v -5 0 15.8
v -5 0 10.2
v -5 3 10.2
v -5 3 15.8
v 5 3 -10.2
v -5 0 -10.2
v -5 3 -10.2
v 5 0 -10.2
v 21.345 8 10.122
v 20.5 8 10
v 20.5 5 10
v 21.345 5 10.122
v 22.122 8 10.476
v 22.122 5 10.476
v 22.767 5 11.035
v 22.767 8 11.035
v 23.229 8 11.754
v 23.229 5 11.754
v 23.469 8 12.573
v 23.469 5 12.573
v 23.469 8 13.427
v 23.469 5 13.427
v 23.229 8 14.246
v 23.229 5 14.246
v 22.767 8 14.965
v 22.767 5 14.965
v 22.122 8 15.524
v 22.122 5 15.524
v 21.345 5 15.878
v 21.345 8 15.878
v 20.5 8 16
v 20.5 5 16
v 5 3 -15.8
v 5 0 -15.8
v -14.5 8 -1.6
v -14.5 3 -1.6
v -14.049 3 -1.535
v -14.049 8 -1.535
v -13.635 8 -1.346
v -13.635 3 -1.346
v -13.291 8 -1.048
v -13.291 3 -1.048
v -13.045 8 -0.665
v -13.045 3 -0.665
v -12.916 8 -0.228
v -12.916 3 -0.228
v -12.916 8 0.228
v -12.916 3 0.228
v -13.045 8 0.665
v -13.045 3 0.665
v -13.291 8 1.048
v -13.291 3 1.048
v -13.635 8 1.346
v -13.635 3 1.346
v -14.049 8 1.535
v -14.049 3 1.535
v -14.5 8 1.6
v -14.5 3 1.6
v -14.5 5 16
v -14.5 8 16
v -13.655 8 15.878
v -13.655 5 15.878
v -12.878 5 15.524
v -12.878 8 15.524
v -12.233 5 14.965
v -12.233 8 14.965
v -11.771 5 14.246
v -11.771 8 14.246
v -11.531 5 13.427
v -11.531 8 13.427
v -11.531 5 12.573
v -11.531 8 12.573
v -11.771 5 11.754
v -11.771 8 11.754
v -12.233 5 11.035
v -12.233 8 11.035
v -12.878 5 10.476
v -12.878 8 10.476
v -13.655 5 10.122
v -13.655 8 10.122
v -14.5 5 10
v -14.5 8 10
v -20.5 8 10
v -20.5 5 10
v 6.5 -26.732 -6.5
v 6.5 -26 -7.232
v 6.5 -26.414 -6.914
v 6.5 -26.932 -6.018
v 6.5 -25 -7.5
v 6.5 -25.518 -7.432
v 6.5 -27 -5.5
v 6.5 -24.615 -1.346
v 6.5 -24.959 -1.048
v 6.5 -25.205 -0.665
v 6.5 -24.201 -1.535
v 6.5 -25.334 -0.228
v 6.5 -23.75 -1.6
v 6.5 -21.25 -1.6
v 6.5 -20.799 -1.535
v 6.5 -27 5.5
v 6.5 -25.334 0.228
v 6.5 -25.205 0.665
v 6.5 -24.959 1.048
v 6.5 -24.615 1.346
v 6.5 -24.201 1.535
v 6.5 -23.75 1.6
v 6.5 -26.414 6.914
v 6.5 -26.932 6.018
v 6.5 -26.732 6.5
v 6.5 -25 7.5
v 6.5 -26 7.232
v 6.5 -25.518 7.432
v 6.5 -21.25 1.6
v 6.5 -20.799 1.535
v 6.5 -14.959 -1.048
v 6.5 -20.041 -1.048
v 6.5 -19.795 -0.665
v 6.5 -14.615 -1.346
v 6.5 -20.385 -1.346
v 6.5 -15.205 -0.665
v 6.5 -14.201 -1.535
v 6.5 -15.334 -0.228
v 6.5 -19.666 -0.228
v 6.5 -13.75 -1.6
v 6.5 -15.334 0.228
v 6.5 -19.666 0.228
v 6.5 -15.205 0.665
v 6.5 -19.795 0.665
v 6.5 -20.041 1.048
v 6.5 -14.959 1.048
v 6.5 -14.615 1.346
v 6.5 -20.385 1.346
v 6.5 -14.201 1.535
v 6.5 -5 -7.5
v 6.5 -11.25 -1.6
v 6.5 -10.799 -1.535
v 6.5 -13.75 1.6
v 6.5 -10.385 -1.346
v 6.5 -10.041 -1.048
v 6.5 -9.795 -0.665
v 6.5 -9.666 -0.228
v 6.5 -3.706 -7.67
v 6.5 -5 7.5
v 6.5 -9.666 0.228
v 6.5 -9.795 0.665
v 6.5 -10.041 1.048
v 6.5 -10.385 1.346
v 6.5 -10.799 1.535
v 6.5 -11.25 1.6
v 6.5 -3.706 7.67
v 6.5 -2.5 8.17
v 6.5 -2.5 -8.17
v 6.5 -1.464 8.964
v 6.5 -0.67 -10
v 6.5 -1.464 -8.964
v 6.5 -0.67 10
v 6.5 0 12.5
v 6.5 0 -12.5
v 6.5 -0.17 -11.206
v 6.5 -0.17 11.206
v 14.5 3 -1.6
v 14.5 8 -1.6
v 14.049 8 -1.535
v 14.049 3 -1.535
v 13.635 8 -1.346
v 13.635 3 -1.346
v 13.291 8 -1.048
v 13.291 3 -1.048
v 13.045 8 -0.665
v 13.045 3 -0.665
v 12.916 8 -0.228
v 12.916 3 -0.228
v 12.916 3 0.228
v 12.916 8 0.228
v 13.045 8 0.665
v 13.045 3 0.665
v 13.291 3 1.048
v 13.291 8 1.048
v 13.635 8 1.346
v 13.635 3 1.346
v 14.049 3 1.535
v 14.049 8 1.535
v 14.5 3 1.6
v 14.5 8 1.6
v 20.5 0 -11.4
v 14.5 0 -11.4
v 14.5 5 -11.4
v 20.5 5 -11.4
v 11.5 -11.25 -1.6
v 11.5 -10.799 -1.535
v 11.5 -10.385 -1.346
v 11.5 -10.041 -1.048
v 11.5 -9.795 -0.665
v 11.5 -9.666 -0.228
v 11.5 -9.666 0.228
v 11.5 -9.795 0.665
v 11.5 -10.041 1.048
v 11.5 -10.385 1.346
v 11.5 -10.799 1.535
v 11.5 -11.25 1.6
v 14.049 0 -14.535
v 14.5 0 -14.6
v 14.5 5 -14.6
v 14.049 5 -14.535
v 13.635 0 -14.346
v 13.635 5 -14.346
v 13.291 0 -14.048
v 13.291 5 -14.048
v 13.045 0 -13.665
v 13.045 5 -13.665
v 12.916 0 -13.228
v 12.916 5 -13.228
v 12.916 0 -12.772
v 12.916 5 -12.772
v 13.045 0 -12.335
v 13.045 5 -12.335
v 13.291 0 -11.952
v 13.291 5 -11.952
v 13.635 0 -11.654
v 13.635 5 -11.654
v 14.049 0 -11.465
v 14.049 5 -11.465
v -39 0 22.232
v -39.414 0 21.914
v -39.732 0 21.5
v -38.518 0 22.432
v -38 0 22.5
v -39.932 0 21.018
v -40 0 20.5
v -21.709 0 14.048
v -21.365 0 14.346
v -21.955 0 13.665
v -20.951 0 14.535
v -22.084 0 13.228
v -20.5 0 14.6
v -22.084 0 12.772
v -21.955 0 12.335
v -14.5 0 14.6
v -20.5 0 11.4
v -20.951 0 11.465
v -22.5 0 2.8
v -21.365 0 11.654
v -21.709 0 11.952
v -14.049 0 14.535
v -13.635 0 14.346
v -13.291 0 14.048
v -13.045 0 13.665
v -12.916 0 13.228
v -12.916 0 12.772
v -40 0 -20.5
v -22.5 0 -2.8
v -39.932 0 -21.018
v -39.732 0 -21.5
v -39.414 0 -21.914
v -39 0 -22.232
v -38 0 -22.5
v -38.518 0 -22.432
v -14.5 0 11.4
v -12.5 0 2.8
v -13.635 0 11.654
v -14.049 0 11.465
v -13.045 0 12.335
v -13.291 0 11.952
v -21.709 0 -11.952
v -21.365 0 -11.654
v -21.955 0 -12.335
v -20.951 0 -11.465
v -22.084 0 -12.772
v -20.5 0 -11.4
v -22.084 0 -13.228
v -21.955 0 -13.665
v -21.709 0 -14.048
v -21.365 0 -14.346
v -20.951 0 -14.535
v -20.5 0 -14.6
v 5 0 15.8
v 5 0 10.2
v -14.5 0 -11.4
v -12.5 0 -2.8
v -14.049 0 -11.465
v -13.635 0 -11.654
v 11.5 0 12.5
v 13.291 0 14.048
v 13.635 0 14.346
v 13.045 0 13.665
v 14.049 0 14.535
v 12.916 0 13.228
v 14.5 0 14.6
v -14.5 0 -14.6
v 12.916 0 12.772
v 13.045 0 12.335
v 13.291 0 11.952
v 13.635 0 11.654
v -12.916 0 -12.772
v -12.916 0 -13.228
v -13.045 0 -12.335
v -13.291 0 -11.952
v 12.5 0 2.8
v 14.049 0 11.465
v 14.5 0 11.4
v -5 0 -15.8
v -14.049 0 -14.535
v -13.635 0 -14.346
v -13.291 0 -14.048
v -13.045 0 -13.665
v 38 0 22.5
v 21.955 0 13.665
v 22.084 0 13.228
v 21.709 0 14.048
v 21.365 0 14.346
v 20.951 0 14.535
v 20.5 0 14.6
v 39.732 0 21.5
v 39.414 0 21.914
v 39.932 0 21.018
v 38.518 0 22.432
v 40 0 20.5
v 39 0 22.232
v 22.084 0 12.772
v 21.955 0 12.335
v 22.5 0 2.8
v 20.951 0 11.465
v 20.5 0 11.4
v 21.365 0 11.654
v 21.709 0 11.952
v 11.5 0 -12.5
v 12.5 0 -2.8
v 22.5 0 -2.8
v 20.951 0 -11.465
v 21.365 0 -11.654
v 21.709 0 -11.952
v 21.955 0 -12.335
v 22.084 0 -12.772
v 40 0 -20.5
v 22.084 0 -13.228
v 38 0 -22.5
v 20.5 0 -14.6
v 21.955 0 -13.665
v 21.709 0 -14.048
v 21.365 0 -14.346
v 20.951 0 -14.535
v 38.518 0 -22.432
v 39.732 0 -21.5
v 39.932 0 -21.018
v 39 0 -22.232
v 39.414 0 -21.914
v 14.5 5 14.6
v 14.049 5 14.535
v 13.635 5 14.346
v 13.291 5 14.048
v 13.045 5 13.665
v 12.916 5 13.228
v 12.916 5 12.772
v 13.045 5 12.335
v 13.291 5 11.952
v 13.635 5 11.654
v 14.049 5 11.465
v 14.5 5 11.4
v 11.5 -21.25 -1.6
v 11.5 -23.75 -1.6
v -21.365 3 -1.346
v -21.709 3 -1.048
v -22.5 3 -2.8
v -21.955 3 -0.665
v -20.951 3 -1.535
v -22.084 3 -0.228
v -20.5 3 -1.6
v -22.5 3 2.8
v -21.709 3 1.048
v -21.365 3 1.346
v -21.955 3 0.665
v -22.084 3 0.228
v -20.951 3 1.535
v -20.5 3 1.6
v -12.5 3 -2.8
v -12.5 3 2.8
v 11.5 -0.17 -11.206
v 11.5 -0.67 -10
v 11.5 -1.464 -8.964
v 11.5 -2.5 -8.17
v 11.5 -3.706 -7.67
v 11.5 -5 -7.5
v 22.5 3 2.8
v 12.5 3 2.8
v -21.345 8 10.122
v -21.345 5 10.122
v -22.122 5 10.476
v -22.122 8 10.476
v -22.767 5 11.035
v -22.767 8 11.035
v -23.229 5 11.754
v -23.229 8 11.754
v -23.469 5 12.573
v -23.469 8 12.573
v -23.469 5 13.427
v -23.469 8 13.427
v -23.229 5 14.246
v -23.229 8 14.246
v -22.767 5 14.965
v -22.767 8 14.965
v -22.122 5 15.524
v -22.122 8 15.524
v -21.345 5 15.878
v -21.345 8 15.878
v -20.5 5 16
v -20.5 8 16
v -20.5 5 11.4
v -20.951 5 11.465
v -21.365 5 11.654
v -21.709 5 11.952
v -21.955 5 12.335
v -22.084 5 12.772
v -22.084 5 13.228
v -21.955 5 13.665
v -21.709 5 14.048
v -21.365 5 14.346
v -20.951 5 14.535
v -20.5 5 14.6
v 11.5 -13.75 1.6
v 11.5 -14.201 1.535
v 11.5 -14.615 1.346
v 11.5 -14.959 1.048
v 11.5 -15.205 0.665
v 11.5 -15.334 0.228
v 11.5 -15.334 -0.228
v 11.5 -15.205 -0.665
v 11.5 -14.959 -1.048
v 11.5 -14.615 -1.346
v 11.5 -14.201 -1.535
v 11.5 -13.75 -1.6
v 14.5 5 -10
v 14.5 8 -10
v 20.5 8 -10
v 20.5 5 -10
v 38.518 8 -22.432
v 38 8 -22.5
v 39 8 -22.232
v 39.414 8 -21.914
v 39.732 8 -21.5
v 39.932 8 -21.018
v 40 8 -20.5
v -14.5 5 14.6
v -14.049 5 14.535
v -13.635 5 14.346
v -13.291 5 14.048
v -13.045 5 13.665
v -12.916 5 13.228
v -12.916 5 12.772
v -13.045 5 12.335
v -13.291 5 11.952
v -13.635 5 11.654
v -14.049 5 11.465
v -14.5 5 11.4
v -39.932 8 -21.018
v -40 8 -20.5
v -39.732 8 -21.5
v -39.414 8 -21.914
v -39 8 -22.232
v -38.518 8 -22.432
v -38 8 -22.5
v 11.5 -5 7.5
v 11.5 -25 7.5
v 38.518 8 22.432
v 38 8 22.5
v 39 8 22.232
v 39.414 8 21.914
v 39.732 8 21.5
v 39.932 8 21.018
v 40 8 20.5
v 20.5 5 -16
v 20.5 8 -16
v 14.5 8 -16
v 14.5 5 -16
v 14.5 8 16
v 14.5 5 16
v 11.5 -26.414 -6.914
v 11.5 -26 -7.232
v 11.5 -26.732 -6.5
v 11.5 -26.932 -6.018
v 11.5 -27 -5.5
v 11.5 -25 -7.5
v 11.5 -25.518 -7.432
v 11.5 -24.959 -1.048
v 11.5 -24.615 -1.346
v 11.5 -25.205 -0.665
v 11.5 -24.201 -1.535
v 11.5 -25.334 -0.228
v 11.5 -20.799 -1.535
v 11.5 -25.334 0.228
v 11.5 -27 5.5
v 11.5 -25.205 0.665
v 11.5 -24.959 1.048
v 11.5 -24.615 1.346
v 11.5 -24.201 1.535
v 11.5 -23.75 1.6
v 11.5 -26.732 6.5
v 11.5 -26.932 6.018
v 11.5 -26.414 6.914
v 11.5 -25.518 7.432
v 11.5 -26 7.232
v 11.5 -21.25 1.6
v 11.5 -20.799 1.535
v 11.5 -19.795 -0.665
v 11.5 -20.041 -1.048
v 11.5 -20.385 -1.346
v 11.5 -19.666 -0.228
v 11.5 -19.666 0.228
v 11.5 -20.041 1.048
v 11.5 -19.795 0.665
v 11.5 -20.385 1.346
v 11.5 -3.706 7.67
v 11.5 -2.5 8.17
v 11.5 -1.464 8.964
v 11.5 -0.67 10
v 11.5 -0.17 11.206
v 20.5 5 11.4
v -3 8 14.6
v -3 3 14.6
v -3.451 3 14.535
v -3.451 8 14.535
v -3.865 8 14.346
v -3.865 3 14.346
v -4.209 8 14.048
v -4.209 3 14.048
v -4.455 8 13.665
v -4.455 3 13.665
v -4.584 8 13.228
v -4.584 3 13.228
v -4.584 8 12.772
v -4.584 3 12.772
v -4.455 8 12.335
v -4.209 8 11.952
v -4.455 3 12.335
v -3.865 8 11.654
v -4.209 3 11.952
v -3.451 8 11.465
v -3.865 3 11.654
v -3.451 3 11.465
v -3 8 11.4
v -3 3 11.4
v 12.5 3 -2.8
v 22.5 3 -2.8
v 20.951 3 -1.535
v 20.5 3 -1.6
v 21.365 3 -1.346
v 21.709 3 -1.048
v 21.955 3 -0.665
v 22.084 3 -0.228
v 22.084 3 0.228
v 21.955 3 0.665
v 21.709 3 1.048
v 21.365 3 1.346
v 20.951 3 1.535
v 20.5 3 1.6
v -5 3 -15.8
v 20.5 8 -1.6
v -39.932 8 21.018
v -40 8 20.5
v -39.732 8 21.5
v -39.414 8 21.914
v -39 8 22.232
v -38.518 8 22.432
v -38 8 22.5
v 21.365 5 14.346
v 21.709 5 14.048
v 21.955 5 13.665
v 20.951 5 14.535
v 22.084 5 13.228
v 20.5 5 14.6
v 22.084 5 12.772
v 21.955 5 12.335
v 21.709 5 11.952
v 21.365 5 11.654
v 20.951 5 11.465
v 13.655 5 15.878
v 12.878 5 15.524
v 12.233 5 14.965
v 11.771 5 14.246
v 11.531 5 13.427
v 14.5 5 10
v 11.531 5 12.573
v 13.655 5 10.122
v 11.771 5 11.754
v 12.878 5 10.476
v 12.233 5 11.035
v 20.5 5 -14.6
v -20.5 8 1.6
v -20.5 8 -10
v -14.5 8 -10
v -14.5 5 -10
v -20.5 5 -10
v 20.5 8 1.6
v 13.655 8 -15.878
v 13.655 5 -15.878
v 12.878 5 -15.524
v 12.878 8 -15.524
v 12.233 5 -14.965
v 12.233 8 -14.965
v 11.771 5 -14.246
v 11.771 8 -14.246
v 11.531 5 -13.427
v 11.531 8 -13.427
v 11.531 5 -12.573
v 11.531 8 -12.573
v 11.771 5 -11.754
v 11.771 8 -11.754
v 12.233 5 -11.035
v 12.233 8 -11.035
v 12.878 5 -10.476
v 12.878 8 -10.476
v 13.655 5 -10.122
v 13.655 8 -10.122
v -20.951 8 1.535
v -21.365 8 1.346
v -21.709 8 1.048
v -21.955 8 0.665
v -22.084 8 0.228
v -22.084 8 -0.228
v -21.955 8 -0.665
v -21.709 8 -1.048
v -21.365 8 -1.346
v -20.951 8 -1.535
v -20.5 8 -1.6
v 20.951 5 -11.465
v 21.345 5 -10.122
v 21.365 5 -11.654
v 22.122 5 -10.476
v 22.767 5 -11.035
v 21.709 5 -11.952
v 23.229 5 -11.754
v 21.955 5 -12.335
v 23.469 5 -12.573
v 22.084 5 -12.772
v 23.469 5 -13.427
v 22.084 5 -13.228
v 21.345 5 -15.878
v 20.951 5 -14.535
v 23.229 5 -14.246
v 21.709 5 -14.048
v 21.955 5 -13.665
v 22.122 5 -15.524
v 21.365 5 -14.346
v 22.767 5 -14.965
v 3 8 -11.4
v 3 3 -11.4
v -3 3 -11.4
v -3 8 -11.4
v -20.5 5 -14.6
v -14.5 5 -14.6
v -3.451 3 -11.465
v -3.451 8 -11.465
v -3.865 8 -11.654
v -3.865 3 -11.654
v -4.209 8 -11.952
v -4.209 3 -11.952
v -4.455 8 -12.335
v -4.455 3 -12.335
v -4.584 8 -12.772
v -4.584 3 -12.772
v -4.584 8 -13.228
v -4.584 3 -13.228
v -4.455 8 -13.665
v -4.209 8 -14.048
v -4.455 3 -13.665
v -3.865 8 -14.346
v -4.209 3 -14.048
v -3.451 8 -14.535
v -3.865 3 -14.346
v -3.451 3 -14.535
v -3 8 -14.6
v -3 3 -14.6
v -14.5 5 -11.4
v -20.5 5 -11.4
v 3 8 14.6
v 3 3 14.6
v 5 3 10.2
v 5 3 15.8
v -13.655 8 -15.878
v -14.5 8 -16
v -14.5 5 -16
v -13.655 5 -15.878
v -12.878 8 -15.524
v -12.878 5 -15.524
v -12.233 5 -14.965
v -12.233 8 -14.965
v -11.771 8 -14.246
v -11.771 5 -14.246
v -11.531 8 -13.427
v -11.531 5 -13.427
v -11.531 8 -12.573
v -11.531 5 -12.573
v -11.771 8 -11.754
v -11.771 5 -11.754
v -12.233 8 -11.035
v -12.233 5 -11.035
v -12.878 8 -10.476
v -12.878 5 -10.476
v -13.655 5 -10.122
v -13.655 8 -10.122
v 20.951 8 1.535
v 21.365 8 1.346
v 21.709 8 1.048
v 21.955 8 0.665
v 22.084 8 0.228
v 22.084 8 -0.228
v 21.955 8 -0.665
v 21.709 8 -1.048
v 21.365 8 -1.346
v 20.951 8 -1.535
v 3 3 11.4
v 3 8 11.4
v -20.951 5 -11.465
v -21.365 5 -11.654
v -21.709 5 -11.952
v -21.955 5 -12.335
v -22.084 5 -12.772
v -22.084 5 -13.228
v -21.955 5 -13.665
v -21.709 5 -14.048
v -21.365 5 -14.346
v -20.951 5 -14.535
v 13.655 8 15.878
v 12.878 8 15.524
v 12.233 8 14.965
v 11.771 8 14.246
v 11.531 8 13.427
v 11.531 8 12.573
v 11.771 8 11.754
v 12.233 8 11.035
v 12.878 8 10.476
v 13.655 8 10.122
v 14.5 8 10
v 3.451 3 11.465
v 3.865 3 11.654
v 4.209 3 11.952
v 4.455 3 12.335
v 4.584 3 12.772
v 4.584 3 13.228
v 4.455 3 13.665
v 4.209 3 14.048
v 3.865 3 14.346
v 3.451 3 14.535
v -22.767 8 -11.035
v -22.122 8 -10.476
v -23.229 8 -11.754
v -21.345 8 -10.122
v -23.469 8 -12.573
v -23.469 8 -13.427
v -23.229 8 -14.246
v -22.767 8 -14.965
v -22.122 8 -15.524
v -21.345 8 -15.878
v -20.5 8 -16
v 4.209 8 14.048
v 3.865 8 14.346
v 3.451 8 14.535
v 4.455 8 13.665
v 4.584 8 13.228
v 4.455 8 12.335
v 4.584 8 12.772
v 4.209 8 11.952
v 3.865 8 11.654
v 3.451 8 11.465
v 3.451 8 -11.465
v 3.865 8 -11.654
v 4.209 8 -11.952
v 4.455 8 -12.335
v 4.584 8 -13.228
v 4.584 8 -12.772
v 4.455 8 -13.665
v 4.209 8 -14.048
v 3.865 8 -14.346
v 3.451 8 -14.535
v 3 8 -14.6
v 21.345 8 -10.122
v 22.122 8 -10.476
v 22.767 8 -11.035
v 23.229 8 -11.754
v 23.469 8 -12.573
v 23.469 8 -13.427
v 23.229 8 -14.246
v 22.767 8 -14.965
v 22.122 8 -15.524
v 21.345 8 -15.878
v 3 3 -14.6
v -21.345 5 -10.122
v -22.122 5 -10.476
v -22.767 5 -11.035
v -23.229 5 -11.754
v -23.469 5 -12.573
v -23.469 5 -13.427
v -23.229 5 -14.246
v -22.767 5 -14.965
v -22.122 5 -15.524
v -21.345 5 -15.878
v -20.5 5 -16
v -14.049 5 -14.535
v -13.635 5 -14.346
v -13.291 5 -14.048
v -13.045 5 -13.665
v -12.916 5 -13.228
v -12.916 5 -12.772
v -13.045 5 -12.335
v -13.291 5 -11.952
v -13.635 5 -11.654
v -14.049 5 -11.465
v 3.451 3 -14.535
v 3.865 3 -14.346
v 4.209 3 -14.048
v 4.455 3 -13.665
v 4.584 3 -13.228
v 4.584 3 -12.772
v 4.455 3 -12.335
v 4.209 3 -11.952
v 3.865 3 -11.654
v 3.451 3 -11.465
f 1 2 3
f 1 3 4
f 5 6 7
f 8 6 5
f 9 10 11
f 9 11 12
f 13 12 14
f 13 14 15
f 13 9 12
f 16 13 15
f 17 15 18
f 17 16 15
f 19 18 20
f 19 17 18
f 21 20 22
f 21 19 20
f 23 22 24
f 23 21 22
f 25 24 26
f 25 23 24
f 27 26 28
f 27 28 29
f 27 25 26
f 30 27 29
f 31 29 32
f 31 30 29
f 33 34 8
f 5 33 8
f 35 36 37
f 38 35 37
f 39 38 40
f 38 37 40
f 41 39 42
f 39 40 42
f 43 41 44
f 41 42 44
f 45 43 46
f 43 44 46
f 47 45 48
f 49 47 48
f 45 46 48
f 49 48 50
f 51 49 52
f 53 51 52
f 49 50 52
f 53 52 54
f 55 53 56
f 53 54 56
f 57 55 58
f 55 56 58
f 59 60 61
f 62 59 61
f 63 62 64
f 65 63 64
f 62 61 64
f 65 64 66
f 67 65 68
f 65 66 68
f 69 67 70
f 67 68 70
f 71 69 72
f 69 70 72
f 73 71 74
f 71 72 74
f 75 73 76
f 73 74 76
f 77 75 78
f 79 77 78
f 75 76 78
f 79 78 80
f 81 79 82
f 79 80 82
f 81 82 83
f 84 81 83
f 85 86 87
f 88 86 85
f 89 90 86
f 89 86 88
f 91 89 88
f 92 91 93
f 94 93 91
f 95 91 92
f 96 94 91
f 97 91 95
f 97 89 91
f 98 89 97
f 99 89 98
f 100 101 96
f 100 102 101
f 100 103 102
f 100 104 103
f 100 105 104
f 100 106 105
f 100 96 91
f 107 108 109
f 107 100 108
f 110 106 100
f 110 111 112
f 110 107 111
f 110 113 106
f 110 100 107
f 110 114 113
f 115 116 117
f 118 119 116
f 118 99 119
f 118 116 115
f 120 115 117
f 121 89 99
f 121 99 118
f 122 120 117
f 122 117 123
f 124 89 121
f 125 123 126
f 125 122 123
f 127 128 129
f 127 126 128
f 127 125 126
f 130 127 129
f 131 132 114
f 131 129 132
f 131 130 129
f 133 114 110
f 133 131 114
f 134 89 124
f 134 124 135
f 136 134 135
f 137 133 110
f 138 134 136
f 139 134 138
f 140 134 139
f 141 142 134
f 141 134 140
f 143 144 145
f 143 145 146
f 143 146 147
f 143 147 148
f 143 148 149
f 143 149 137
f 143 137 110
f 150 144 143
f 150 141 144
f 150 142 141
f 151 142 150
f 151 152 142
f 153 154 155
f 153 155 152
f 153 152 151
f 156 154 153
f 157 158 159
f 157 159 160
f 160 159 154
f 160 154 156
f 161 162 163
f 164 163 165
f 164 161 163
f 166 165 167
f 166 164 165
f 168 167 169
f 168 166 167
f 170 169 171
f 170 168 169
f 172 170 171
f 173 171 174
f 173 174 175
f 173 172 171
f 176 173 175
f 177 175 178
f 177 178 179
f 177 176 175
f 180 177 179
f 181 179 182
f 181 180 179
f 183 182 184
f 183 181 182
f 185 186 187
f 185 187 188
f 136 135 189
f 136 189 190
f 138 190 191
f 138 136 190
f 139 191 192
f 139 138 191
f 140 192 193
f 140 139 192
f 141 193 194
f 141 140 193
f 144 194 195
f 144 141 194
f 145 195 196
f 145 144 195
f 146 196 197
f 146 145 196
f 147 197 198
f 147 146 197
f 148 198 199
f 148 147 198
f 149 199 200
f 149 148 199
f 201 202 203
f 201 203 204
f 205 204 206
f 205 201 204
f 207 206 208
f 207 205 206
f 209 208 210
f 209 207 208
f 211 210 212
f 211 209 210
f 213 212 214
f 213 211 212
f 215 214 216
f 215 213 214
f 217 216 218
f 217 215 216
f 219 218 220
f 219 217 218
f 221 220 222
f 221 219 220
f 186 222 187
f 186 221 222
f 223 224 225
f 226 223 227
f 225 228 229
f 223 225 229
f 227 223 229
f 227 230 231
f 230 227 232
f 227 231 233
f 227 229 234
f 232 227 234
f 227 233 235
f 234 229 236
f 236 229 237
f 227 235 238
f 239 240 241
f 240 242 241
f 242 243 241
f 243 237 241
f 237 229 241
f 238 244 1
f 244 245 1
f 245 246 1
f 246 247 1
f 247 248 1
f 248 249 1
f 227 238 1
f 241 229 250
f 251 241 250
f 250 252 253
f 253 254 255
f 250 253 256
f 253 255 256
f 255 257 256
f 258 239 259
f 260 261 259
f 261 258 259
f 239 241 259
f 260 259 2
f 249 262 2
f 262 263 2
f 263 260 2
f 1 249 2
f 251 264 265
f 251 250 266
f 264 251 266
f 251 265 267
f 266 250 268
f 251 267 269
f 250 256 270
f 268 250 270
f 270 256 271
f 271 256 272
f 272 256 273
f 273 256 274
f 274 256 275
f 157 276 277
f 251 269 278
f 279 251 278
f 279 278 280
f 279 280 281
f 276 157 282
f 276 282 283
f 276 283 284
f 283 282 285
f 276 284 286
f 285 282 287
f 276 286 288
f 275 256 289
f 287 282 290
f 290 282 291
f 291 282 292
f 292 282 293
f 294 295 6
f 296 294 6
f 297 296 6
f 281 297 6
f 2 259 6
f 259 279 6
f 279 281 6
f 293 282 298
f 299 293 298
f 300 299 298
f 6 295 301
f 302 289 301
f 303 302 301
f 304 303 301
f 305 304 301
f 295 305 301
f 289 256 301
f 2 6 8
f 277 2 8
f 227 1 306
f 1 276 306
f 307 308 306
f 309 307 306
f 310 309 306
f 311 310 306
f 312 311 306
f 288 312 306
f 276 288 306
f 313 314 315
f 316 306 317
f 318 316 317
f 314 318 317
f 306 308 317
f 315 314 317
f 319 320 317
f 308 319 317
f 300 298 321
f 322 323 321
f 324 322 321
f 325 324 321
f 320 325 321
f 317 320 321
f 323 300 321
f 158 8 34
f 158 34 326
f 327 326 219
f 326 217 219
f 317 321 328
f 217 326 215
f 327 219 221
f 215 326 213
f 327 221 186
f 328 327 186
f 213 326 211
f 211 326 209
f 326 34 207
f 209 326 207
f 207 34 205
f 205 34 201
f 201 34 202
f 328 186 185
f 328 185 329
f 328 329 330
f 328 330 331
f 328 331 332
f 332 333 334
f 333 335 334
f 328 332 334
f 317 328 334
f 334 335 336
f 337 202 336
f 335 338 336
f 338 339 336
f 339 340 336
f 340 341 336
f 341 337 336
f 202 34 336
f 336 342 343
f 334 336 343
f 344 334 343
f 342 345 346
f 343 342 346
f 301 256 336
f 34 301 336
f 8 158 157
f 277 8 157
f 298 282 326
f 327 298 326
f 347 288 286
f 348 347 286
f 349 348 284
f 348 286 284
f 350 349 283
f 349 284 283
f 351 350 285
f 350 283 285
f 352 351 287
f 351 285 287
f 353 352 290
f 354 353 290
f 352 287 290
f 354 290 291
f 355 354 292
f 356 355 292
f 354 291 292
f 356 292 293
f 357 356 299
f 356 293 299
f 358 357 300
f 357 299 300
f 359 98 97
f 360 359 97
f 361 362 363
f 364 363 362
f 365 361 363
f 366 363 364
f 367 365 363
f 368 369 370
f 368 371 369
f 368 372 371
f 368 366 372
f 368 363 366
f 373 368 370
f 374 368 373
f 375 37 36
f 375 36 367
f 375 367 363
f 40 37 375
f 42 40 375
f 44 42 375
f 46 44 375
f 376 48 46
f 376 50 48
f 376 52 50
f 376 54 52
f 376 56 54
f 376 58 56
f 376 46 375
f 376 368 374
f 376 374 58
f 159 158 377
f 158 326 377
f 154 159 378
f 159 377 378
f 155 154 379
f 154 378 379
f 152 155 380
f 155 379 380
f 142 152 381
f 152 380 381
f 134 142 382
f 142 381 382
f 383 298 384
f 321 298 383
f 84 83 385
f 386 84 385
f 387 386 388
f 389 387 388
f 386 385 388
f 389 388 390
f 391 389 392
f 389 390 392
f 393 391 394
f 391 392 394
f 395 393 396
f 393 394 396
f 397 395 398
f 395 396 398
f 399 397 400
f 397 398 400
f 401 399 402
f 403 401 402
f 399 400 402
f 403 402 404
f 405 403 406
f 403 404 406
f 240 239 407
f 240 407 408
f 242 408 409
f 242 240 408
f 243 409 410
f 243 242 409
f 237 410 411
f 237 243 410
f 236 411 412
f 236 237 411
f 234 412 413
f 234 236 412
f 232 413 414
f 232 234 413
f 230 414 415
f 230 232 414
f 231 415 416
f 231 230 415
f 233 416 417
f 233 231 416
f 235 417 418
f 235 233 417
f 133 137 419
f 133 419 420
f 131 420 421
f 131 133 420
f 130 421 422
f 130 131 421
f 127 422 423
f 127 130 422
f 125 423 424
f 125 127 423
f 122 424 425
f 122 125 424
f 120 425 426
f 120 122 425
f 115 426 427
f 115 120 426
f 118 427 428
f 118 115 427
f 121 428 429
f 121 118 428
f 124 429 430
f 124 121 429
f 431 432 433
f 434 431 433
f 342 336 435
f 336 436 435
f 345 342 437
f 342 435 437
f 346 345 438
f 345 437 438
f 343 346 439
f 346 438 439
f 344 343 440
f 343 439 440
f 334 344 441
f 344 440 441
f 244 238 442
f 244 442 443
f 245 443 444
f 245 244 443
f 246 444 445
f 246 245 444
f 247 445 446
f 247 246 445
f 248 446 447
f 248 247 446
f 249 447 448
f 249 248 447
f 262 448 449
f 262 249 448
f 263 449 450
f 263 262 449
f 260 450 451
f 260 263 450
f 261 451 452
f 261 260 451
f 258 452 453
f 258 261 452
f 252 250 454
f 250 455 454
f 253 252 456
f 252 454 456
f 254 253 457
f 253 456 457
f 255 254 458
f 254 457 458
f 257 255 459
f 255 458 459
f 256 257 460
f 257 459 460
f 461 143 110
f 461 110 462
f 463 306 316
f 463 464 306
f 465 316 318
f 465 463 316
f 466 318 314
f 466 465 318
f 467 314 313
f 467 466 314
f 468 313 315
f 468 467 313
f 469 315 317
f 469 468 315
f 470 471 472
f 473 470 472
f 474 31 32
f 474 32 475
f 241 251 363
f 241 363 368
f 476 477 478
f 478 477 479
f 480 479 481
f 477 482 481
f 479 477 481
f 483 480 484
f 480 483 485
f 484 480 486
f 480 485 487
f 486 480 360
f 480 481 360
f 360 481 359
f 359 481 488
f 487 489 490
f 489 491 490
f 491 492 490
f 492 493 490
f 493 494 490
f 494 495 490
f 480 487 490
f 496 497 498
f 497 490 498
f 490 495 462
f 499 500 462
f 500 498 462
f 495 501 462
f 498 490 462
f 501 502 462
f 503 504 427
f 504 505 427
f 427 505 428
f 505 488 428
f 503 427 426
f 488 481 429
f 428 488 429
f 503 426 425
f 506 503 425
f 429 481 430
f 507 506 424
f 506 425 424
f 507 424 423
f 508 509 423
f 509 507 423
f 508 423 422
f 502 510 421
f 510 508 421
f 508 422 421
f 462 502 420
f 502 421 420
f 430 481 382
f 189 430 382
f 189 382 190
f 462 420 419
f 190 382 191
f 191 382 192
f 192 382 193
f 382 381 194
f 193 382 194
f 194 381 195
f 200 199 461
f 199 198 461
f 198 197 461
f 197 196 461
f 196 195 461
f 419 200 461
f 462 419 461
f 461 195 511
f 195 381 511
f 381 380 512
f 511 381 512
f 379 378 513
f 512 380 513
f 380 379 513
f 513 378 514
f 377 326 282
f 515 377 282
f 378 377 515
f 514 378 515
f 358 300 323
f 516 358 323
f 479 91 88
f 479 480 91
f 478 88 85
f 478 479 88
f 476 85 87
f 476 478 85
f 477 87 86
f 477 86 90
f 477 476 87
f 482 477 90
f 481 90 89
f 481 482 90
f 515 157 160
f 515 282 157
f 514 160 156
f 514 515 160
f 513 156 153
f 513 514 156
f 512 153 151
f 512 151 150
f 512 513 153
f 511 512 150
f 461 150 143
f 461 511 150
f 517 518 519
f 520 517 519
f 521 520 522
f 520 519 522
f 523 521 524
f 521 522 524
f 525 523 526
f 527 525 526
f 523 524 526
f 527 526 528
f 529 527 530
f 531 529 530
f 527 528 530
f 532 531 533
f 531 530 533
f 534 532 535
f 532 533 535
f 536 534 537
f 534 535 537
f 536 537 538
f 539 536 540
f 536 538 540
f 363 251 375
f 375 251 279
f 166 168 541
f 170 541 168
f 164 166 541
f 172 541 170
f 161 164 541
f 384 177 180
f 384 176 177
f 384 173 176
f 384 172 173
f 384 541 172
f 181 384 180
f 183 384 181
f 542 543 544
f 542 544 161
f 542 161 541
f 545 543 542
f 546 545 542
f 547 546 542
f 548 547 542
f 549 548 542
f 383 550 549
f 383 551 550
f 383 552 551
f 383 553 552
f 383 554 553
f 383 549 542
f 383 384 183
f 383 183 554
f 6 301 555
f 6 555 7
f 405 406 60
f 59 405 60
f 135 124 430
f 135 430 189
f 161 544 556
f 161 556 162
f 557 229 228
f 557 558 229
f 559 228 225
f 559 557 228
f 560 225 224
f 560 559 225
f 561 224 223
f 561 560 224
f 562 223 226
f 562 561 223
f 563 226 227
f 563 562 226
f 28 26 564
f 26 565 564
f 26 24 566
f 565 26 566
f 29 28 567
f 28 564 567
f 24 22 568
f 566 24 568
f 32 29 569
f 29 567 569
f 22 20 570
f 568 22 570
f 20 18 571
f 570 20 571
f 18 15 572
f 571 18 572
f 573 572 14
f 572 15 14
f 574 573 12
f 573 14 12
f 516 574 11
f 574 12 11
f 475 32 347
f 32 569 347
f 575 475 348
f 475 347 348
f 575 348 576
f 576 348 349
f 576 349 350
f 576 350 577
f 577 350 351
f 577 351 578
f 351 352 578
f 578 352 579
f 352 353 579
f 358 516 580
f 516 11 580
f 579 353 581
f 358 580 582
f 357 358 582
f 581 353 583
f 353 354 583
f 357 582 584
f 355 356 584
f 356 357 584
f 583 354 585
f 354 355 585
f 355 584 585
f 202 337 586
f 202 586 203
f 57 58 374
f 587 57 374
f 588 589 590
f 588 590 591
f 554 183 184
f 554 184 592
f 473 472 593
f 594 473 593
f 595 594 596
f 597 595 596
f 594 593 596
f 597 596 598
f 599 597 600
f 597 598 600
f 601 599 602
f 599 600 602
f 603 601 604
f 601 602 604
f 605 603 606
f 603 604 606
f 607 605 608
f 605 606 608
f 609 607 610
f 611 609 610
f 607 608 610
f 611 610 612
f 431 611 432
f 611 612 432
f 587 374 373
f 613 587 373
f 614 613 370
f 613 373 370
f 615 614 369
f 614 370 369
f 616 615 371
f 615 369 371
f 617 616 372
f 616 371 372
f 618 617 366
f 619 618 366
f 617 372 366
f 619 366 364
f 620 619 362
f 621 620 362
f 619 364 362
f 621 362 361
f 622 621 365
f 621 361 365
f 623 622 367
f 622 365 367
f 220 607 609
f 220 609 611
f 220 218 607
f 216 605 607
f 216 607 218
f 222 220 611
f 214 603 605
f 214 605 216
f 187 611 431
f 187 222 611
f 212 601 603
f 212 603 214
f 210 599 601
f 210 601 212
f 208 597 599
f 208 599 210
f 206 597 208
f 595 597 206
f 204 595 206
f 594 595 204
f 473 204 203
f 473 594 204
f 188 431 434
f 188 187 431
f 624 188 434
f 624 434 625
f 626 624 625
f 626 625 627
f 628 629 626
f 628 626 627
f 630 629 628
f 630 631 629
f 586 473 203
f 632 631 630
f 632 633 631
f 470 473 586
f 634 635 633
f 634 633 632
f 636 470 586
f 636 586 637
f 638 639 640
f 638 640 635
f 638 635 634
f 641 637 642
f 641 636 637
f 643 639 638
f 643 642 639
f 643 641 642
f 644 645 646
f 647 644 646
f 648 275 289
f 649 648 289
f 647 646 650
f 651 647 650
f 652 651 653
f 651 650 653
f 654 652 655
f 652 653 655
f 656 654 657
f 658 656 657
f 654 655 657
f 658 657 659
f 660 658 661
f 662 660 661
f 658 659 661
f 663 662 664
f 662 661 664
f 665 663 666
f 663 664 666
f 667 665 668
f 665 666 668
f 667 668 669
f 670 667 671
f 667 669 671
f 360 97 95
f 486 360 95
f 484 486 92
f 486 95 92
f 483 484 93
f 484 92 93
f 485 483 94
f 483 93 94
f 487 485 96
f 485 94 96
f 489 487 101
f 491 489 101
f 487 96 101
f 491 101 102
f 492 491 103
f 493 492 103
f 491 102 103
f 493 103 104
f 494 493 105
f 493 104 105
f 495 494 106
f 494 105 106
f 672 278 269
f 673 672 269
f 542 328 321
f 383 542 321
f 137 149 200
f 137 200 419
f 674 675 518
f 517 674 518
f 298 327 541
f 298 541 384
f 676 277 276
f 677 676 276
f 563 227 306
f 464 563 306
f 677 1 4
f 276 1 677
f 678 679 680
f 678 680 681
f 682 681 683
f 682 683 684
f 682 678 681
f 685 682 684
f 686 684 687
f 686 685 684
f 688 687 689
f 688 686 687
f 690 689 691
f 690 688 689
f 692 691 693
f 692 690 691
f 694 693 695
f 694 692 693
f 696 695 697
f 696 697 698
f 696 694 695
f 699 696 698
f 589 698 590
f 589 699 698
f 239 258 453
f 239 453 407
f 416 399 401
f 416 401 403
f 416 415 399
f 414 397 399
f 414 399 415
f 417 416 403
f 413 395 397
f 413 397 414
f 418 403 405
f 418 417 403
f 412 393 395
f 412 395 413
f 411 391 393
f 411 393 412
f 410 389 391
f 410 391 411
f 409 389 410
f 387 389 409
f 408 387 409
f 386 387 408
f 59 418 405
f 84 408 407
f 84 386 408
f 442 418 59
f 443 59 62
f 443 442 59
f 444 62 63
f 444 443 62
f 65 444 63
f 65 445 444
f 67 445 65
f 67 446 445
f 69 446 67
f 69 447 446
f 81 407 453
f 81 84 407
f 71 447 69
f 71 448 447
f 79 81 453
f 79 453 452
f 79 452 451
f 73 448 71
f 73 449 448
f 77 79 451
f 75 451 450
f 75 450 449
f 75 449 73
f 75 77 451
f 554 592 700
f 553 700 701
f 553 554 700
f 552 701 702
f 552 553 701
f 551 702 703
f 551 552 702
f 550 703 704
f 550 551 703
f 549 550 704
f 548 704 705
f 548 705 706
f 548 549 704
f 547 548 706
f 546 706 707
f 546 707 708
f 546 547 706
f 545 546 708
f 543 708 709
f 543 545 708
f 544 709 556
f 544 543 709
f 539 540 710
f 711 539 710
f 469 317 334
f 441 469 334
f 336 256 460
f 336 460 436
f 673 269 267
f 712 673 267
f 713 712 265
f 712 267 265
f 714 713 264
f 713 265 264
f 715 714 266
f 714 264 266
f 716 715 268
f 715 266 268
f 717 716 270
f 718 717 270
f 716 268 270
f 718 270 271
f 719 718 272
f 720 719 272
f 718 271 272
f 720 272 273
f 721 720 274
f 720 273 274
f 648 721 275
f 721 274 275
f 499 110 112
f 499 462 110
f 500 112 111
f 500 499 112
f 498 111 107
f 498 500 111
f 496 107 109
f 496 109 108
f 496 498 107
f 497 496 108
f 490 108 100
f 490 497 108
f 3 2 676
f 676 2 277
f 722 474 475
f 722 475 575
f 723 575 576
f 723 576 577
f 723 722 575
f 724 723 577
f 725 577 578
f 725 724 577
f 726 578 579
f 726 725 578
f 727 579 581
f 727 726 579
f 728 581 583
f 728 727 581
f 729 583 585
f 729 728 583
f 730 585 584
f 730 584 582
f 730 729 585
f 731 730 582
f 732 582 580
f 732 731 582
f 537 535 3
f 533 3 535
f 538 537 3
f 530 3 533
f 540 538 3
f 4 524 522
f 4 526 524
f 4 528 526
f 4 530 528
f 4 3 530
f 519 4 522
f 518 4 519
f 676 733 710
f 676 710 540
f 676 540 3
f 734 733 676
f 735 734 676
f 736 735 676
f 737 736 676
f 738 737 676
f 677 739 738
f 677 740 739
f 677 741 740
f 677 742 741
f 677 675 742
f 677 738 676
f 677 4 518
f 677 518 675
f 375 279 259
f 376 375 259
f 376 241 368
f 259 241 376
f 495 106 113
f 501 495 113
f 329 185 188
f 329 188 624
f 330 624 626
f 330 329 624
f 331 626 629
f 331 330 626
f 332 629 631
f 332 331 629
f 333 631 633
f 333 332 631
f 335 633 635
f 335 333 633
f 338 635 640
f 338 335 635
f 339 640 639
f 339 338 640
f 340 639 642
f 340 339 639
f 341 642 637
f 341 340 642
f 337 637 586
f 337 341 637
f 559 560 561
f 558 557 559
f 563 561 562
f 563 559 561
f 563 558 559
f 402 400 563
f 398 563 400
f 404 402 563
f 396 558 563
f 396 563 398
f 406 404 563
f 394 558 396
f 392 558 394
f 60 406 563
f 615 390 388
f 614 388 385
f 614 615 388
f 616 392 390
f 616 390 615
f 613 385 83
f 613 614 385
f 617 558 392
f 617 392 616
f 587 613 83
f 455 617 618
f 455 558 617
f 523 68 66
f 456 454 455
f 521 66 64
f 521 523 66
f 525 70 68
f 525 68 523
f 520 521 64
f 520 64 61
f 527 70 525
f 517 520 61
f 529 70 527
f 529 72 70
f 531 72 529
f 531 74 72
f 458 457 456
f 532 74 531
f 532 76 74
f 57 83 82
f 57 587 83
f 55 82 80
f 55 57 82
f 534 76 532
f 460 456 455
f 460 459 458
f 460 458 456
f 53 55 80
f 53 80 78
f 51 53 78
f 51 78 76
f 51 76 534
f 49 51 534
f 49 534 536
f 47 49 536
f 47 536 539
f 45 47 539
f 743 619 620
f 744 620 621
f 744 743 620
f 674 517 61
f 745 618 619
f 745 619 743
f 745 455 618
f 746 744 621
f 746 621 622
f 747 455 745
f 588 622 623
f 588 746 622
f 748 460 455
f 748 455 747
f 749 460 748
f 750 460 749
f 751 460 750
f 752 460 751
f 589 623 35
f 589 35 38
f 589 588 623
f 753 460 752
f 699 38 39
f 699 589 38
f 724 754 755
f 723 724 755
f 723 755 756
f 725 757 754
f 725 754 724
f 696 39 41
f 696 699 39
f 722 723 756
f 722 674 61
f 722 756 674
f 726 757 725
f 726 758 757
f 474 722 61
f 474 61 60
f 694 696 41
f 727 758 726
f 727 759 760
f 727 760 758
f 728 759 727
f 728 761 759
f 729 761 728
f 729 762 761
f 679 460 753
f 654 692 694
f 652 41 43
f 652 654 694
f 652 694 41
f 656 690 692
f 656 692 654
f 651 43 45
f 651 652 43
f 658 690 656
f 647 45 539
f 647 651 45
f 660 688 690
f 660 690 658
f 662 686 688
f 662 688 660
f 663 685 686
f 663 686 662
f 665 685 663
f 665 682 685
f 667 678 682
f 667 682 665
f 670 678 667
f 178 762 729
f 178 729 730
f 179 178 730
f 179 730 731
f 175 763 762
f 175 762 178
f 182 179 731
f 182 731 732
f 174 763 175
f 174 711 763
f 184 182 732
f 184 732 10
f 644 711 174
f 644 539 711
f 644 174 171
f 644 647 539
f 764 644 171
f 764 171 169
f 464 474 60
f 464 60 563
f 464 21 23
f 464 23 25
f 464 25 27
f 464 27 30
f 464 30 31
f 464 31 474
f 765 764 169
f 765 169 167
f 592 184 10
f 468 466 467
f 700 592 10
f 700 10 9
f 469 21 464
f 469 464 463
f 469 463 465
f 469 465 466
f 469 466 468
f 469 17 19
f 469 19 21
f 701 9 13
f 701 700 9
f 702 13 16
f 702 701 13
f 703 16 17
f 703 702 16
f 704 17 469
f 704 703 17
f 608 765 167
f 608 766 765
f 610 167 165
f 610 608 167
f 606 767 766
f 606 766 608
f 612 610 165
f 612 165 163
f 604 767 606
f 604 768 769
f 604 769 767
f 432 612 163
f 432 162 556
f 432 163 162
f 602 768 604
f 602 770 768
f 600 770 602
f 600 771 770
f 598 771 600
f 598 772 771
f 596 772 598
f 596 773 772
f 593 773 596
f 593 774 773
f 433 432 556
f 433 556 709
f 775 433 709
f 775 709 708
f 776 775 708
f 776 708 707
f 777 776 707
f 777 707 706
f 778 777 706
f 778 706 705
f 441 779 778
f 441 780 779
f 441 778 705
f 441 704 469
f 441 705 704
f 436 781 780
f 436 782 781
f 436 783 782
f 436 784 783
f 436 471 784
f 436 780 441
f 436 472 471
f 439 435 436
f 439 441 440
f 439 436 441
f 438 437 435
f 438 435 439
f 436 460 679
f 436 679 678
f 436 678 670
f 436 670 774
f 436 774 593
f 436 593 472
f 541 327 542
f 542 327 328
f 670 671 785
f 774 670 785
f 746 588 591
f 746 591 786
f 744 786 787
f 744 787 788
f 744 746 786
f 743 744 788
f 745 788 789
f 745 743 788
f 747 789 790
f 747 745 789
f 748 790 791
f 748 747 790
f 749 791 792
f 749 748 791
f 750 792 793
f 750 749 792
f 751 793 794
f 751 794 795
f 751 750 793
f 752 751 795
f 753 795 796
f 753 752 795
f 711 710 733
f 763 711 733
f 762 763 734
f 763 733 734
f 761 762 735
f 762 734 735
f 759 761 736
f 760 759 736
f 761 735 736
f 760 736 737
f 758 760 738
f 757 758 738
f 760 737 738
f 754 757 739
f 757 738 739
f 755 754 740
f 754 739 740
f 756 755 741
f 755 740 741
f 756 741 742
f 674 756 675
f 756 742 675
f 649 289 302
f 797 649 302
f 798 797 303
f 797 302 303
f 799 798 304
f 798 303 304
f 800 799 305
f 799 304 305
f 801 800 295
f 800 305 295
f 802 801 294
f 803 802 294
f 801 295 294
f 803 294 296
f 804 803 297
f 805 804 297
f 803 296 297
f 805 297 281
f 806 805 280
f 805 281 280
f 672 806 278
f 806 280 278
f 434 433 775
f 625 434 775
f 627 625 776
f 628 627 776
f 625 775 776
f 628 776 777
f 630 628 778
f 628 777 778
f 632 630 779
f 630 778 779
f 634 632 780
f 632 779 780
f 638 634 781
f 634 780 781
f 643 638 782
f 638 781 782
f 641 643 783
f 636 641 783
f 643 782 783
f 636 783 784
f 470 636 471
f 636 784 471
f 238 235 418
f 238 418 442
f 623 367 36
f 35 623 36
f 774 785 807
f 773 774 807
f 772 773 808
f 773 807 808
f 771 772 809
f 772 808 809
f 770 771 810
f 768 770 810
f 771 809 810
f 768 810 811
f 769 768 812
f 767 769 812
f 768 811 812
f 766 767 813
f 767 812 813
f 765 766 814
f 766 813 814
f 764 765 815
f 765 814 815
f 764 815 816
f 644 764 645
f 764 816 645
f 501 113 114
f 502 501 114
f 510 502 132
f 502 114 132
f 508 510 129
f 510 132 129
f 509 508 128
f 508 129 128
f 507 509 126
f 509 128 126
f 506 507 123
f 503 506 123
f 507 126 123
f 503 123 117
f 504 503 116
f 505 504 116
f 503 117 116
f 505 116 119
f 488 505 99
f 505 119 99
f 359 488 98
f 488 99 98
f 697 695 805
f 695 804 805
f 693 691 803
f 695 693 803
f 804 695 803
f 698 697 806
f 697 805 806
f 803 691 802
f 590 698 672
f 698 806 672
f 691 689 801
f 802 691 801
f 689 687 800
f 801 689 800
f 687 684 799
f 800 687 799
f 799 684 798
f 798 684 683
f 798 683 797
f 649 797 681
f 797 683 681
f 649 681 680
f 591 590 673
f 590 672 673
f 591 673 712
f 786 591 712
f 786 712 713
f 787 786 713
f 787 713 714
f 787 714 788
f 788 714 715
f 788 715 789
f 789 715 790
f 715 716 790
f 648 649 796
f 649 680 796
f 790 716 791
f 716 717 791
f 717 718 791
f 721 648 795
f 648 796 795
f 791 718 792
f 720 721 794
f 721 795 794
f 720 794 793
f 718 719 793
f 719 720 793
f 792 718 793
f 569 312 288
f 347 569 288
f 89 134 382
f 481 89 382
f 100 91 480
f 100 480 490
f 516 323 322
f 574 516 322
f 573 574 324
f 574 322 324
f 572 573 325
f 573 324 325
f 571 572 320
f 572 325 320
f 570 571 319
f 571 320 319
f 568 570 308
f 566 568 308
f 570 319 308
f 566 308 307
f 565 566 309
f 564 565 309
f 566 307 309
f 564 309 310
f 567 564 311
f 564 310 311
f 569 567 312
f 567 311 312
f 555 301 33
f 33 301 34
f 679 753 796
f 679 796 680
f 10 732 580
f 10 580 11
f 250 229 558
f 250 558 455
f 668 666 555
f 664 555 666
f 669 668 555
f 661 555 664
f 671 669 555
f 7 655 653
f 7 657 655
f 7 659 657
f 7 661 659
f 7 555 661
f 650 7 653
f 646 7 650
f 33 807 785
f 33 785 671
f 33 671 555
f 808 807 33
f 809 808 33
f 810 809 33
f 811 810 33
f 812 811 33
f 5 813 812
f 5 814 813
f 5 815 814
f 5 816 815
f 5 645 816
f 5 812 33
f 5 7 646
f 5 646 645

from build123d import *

# Parameters (mm, degrees)
CROQUIS2_W              = 80
CROQUIS2_H              = 45
SALIENTE_EXTRUIR1_DEPTH = 8
CORTAR_EXTRUIR1_DEPTH   = 3
CROQUIS4_W              = 5
CROQUIS4_H              = 15
SALIENTE_EXTRUIR2_DEPTH = 35
CORTAR_EXTRUIR2_DEPTH   = 34.5
REDONDEO1_R             = 5
CROQUIS6_W              = 10
CROQUIS6_H              = 5.6
CORTAR_EXTRUIR3_DEPTH   = 3
CROQUIS8_W              = 15
CROQUIS8_H              = 8
CORTAR_EXTRUIR4_DEPTH   = 34.5
REDONDEO2_R             = 2


with BuildPart() as part:
    # Croquis2 → Saliente-Extruir1 (new body)
    with BuildSketch(Plane(origin=(0, 0, 0), x_dir=(1, 0, 0), z_dir=(0, 1, 0))):
        Rectangle(CROQUIS2_W, CROQUIS2_H)
        with BuildLine():
            Line((-20.5, 14.6), (-14.5, 14.6))
            ThreePointArc((-14.5, 14.6), (-12.9, 13), (-14.5, 11.4))
            Line((-14.5, 11.4), (-20.5, 11.4))
            ThreePointArc((-20.5, 11.4), (-22.1, 13), (-20.5, 14.6))
        make_face(mode=Mode.SUBTRACT)
        with BuildLine():
            Line((20.5, 14.6), (14.5, 14.6))
            ThreePointArc((14.5, 14.6), (12.9, 13), (14.5, 11.4))
            Line((14.5, 11.4), (20.5, 11.4))
            ThreePointArc((20.5, 11.4), (22.1, 13), (20.5, 14.6))
        make_face(mode=Mode.SUBTRACT)
        with BuildLine():
            Line((20.5, -14.6), (14.5, -14.6))
            ThreePointArc((14.5, -14.6), (12.9, -13), (14.5, -11.4))
            Line((14.5, -11.4), (20.5, -11.4))
            ThreePointArc((20.5, -11.4), (22.1, -13), (20.5, -14.6))
        make_face(mode=Mode.SUBTRACT)
        with BuildLine():
            Line((-20.5, -14.6), (-14.5, -14.6))
            ThreePointArc((-14.5, -14.6), (-12.9, -13), (-14.5, -11.4))
            Line((-14.5, -11.4), (-20.5, -11.4))
            ThreePointArc((-20.5, -11.4), (-22.1, -13), (-20.5, -14.6))
        make_face(mode=Mode.SUBTRACT)
        with BuildLine():
            Line((-20.5, 1.6), (-14.5, 1.6))
            ThreePointArc((-14.5, 1.6), (-12.9, 0), (-14.5, -1.6))
            Line((-14.5, -1.6), (-20.5, -1.6))
            ThreePointArc((-20.5, -1.6), (-22.1, 0), (-20.5, 1.6))
        make_face(mode=Mode.SUBTRACT)
        with BuildLine():
            Line((20.5, 1.6), (14.5, 1.6))
            ThreePointArc((14.5, 1.6), (12.9, 0), (14.5, -1.6))
            Line((14.5, -1.6), (20.5, -1.6))
            ThreePointArc((20.5, -1.6), (22.1, 0), (20.5, 1.6))
        make_face(mode=Mode.SUBTRACT)
        with BuildLine():
            Line((-3, 14.6), (3, 14.6))
            ThreePointArc((3, 14.6), (4.6, 13), (3, 11.4))
            Line((3, 11.4), (-3, 11.4))
            ThreePointArc((-3, 11.4), (-4.6, 13), (-3, 14.6))
        make_face(mode=Mode.SUBTRACT)
        with BuildLine():
            Line((-3, -11.4), (3, -11.4))
            ThreePointArc((3, -11.4), (4.6, -13), (3, -14.6))
            Line((3, -14.6), (-3, -14.6))
            ThreePointArc((-3, -14.6), (-4.6, -13), (-3, -11.4))
        make_face(mode=Mode.SUBTRACT)
    extrude(amount=SALIENTE_EXTRUIR1_DEPTH)

    # Croquis3 → Cortar-Extruir1 (cut)
    with BuildSketch(Plane(origin=(0, 8, 0), x_dir=(1, 0, 0), z_dir=(0, 1, 0))):
        with BuildLine():
            Line((-20.5, 16), (-14.5, 16))
            ThreePointArc((-14.5, 16), (-11.5, 13), (-14.5, 10))
            Line((-14.5, 10), (-20.5, 10))
            ThreePointArc((-20.5, 10), (-23.5, 13), (-20.5, 16))
        make_face()
        with BuildLine():
            Line((20.5, 16), (14.5, 16))
            ThreePointArc((14.5, 16), (11.5, 13), (14.5, 10))
            Line((14.5, 10), (20.5, 10))
            ThreePointArc((20.5, 10), (23.5, 13), (20.5, 16))
        make_face()
        with BuildLine():
            Line((20.5, -16), (14.5, -16))
            ThreePointArc((14.5, -16), (11.5, -13), (14.5, -10))
            Line((14.5, -10), (20.5, -10))
            ThreePointArc((20.5, -10), (23.5, -13), (20.5, -16))
        make_face()
        with BuildLine():
            Line((-20.5, -16), (-14.5, -16))
            ThreePointArc((-14.5, -16), (-11.5, -13), (-14.5, -10))
            Line((-14.5, -10), (-20.5, -10))
            ThreePointArc((-20.5, -10), (-23.5, -13), (-20.5, -16))
        make_face()
    extrude(amount=-CORTAR_EXTRUIR1_DEPTH, mode=Mode.SUBTRACT)

    # Croquis4 → Saliente-Extruir2 (add)
    with BuildSketch(Plane.XZ):
        with Locations((9, 0)):
            Rectangle(CROQUIS4_W, CROQUIS4_H)
    extrude(amount=SALIENTE_EXTRUIR2_DEPTH)

    # Croquis5 → Cortar-Extruir2 (cut, through all)
    with BuildSketch(Plane.ZY.offset(-6.5)):
        with BuildLine():
            Line((1.6, -11.25), (1.6, -13.75))
            ThreePointArc((1.6, -13.75), (0, -15.35), (-1.6, -13.75))
            Line((-1.6, -13.75), (-1.6, -11.25))
            ThreePointArc((-1.6, -11.25), (0, -9.65), (1.6, -11.25))
        make_face()
        with BuildLine():
            Line((1.6, -23.75), (1.6, -21.25))
            ThreePointArc((1.6, -21.25), (0, -19.65), (-1.6, -21.25))
            Line((-1.6, -21.25), (-1.6, -23.75))
            ThreePointArc((-1.6, -23.75), (0, -25.35), (1.6, -23.75))
        make_face()
    extrude(amount=-CORTAR_EXTRUIR2_DEPTH, mode=Mode.SUBTRACT)

    # Redondeo1
    redondeo1_edges = [part.edges().sort_by_distance(p)[0] for p in [
        (9, 0, 7.5),
        (9, 0, -7.5),
    ]]
    fillet(redondeo1_edges, radius=REDONDEO1_R)

    # Croquis6 → Cortar-Extruir3 (cut)
    with BuildSketch(Plane.XZ):
        with Locations((-17.5, 0)):
            Rectangle(CROQUIS6_W, CROQUIS6_H)
        with Locations((17.5, 0)):
            Rectangle(CROQUIS6_W, CROQUIS6_H)
        with Locations((0, 13)):
            Rectangle(CROQUIS6_W, CROQUIS6_H)
        with Locations((0, -13)):
            Rectangle(CROQUIS6_W, CROQUIS6_H)
    extrude(amount=-CORTAR_EXTRUIR3_DEPTH, mode=Mode.SUBTRACT)

    # Croquis8 → Cortar-Extruir4 (cut, through all)
    with BuildSketch(Plane.ZY.offset(-6.5)):
        with Locations((0, -31)):
            Rectangle(CROQUIS8_W, CROQUIS8_H)
    extrude(amount=-CORTAR_EXTRUIR4_DEPTH, mode=Mode.SUBTRACT)

    # Redondeo2
    redondeo2_edges = [part.edges().sort_by_distance(p)[0] for p in [
        (9, -27, -7.5),
        (9, -27, 7.5),
        (40, 4, 22.5),
        (-40, 4, 22.5),
        (-40, 4, -22.5),
        (40, 4, -22.5),
    ]]
    fillet(redondeo2_edges, radius=REDONDEO2_R)


solid = part.part
